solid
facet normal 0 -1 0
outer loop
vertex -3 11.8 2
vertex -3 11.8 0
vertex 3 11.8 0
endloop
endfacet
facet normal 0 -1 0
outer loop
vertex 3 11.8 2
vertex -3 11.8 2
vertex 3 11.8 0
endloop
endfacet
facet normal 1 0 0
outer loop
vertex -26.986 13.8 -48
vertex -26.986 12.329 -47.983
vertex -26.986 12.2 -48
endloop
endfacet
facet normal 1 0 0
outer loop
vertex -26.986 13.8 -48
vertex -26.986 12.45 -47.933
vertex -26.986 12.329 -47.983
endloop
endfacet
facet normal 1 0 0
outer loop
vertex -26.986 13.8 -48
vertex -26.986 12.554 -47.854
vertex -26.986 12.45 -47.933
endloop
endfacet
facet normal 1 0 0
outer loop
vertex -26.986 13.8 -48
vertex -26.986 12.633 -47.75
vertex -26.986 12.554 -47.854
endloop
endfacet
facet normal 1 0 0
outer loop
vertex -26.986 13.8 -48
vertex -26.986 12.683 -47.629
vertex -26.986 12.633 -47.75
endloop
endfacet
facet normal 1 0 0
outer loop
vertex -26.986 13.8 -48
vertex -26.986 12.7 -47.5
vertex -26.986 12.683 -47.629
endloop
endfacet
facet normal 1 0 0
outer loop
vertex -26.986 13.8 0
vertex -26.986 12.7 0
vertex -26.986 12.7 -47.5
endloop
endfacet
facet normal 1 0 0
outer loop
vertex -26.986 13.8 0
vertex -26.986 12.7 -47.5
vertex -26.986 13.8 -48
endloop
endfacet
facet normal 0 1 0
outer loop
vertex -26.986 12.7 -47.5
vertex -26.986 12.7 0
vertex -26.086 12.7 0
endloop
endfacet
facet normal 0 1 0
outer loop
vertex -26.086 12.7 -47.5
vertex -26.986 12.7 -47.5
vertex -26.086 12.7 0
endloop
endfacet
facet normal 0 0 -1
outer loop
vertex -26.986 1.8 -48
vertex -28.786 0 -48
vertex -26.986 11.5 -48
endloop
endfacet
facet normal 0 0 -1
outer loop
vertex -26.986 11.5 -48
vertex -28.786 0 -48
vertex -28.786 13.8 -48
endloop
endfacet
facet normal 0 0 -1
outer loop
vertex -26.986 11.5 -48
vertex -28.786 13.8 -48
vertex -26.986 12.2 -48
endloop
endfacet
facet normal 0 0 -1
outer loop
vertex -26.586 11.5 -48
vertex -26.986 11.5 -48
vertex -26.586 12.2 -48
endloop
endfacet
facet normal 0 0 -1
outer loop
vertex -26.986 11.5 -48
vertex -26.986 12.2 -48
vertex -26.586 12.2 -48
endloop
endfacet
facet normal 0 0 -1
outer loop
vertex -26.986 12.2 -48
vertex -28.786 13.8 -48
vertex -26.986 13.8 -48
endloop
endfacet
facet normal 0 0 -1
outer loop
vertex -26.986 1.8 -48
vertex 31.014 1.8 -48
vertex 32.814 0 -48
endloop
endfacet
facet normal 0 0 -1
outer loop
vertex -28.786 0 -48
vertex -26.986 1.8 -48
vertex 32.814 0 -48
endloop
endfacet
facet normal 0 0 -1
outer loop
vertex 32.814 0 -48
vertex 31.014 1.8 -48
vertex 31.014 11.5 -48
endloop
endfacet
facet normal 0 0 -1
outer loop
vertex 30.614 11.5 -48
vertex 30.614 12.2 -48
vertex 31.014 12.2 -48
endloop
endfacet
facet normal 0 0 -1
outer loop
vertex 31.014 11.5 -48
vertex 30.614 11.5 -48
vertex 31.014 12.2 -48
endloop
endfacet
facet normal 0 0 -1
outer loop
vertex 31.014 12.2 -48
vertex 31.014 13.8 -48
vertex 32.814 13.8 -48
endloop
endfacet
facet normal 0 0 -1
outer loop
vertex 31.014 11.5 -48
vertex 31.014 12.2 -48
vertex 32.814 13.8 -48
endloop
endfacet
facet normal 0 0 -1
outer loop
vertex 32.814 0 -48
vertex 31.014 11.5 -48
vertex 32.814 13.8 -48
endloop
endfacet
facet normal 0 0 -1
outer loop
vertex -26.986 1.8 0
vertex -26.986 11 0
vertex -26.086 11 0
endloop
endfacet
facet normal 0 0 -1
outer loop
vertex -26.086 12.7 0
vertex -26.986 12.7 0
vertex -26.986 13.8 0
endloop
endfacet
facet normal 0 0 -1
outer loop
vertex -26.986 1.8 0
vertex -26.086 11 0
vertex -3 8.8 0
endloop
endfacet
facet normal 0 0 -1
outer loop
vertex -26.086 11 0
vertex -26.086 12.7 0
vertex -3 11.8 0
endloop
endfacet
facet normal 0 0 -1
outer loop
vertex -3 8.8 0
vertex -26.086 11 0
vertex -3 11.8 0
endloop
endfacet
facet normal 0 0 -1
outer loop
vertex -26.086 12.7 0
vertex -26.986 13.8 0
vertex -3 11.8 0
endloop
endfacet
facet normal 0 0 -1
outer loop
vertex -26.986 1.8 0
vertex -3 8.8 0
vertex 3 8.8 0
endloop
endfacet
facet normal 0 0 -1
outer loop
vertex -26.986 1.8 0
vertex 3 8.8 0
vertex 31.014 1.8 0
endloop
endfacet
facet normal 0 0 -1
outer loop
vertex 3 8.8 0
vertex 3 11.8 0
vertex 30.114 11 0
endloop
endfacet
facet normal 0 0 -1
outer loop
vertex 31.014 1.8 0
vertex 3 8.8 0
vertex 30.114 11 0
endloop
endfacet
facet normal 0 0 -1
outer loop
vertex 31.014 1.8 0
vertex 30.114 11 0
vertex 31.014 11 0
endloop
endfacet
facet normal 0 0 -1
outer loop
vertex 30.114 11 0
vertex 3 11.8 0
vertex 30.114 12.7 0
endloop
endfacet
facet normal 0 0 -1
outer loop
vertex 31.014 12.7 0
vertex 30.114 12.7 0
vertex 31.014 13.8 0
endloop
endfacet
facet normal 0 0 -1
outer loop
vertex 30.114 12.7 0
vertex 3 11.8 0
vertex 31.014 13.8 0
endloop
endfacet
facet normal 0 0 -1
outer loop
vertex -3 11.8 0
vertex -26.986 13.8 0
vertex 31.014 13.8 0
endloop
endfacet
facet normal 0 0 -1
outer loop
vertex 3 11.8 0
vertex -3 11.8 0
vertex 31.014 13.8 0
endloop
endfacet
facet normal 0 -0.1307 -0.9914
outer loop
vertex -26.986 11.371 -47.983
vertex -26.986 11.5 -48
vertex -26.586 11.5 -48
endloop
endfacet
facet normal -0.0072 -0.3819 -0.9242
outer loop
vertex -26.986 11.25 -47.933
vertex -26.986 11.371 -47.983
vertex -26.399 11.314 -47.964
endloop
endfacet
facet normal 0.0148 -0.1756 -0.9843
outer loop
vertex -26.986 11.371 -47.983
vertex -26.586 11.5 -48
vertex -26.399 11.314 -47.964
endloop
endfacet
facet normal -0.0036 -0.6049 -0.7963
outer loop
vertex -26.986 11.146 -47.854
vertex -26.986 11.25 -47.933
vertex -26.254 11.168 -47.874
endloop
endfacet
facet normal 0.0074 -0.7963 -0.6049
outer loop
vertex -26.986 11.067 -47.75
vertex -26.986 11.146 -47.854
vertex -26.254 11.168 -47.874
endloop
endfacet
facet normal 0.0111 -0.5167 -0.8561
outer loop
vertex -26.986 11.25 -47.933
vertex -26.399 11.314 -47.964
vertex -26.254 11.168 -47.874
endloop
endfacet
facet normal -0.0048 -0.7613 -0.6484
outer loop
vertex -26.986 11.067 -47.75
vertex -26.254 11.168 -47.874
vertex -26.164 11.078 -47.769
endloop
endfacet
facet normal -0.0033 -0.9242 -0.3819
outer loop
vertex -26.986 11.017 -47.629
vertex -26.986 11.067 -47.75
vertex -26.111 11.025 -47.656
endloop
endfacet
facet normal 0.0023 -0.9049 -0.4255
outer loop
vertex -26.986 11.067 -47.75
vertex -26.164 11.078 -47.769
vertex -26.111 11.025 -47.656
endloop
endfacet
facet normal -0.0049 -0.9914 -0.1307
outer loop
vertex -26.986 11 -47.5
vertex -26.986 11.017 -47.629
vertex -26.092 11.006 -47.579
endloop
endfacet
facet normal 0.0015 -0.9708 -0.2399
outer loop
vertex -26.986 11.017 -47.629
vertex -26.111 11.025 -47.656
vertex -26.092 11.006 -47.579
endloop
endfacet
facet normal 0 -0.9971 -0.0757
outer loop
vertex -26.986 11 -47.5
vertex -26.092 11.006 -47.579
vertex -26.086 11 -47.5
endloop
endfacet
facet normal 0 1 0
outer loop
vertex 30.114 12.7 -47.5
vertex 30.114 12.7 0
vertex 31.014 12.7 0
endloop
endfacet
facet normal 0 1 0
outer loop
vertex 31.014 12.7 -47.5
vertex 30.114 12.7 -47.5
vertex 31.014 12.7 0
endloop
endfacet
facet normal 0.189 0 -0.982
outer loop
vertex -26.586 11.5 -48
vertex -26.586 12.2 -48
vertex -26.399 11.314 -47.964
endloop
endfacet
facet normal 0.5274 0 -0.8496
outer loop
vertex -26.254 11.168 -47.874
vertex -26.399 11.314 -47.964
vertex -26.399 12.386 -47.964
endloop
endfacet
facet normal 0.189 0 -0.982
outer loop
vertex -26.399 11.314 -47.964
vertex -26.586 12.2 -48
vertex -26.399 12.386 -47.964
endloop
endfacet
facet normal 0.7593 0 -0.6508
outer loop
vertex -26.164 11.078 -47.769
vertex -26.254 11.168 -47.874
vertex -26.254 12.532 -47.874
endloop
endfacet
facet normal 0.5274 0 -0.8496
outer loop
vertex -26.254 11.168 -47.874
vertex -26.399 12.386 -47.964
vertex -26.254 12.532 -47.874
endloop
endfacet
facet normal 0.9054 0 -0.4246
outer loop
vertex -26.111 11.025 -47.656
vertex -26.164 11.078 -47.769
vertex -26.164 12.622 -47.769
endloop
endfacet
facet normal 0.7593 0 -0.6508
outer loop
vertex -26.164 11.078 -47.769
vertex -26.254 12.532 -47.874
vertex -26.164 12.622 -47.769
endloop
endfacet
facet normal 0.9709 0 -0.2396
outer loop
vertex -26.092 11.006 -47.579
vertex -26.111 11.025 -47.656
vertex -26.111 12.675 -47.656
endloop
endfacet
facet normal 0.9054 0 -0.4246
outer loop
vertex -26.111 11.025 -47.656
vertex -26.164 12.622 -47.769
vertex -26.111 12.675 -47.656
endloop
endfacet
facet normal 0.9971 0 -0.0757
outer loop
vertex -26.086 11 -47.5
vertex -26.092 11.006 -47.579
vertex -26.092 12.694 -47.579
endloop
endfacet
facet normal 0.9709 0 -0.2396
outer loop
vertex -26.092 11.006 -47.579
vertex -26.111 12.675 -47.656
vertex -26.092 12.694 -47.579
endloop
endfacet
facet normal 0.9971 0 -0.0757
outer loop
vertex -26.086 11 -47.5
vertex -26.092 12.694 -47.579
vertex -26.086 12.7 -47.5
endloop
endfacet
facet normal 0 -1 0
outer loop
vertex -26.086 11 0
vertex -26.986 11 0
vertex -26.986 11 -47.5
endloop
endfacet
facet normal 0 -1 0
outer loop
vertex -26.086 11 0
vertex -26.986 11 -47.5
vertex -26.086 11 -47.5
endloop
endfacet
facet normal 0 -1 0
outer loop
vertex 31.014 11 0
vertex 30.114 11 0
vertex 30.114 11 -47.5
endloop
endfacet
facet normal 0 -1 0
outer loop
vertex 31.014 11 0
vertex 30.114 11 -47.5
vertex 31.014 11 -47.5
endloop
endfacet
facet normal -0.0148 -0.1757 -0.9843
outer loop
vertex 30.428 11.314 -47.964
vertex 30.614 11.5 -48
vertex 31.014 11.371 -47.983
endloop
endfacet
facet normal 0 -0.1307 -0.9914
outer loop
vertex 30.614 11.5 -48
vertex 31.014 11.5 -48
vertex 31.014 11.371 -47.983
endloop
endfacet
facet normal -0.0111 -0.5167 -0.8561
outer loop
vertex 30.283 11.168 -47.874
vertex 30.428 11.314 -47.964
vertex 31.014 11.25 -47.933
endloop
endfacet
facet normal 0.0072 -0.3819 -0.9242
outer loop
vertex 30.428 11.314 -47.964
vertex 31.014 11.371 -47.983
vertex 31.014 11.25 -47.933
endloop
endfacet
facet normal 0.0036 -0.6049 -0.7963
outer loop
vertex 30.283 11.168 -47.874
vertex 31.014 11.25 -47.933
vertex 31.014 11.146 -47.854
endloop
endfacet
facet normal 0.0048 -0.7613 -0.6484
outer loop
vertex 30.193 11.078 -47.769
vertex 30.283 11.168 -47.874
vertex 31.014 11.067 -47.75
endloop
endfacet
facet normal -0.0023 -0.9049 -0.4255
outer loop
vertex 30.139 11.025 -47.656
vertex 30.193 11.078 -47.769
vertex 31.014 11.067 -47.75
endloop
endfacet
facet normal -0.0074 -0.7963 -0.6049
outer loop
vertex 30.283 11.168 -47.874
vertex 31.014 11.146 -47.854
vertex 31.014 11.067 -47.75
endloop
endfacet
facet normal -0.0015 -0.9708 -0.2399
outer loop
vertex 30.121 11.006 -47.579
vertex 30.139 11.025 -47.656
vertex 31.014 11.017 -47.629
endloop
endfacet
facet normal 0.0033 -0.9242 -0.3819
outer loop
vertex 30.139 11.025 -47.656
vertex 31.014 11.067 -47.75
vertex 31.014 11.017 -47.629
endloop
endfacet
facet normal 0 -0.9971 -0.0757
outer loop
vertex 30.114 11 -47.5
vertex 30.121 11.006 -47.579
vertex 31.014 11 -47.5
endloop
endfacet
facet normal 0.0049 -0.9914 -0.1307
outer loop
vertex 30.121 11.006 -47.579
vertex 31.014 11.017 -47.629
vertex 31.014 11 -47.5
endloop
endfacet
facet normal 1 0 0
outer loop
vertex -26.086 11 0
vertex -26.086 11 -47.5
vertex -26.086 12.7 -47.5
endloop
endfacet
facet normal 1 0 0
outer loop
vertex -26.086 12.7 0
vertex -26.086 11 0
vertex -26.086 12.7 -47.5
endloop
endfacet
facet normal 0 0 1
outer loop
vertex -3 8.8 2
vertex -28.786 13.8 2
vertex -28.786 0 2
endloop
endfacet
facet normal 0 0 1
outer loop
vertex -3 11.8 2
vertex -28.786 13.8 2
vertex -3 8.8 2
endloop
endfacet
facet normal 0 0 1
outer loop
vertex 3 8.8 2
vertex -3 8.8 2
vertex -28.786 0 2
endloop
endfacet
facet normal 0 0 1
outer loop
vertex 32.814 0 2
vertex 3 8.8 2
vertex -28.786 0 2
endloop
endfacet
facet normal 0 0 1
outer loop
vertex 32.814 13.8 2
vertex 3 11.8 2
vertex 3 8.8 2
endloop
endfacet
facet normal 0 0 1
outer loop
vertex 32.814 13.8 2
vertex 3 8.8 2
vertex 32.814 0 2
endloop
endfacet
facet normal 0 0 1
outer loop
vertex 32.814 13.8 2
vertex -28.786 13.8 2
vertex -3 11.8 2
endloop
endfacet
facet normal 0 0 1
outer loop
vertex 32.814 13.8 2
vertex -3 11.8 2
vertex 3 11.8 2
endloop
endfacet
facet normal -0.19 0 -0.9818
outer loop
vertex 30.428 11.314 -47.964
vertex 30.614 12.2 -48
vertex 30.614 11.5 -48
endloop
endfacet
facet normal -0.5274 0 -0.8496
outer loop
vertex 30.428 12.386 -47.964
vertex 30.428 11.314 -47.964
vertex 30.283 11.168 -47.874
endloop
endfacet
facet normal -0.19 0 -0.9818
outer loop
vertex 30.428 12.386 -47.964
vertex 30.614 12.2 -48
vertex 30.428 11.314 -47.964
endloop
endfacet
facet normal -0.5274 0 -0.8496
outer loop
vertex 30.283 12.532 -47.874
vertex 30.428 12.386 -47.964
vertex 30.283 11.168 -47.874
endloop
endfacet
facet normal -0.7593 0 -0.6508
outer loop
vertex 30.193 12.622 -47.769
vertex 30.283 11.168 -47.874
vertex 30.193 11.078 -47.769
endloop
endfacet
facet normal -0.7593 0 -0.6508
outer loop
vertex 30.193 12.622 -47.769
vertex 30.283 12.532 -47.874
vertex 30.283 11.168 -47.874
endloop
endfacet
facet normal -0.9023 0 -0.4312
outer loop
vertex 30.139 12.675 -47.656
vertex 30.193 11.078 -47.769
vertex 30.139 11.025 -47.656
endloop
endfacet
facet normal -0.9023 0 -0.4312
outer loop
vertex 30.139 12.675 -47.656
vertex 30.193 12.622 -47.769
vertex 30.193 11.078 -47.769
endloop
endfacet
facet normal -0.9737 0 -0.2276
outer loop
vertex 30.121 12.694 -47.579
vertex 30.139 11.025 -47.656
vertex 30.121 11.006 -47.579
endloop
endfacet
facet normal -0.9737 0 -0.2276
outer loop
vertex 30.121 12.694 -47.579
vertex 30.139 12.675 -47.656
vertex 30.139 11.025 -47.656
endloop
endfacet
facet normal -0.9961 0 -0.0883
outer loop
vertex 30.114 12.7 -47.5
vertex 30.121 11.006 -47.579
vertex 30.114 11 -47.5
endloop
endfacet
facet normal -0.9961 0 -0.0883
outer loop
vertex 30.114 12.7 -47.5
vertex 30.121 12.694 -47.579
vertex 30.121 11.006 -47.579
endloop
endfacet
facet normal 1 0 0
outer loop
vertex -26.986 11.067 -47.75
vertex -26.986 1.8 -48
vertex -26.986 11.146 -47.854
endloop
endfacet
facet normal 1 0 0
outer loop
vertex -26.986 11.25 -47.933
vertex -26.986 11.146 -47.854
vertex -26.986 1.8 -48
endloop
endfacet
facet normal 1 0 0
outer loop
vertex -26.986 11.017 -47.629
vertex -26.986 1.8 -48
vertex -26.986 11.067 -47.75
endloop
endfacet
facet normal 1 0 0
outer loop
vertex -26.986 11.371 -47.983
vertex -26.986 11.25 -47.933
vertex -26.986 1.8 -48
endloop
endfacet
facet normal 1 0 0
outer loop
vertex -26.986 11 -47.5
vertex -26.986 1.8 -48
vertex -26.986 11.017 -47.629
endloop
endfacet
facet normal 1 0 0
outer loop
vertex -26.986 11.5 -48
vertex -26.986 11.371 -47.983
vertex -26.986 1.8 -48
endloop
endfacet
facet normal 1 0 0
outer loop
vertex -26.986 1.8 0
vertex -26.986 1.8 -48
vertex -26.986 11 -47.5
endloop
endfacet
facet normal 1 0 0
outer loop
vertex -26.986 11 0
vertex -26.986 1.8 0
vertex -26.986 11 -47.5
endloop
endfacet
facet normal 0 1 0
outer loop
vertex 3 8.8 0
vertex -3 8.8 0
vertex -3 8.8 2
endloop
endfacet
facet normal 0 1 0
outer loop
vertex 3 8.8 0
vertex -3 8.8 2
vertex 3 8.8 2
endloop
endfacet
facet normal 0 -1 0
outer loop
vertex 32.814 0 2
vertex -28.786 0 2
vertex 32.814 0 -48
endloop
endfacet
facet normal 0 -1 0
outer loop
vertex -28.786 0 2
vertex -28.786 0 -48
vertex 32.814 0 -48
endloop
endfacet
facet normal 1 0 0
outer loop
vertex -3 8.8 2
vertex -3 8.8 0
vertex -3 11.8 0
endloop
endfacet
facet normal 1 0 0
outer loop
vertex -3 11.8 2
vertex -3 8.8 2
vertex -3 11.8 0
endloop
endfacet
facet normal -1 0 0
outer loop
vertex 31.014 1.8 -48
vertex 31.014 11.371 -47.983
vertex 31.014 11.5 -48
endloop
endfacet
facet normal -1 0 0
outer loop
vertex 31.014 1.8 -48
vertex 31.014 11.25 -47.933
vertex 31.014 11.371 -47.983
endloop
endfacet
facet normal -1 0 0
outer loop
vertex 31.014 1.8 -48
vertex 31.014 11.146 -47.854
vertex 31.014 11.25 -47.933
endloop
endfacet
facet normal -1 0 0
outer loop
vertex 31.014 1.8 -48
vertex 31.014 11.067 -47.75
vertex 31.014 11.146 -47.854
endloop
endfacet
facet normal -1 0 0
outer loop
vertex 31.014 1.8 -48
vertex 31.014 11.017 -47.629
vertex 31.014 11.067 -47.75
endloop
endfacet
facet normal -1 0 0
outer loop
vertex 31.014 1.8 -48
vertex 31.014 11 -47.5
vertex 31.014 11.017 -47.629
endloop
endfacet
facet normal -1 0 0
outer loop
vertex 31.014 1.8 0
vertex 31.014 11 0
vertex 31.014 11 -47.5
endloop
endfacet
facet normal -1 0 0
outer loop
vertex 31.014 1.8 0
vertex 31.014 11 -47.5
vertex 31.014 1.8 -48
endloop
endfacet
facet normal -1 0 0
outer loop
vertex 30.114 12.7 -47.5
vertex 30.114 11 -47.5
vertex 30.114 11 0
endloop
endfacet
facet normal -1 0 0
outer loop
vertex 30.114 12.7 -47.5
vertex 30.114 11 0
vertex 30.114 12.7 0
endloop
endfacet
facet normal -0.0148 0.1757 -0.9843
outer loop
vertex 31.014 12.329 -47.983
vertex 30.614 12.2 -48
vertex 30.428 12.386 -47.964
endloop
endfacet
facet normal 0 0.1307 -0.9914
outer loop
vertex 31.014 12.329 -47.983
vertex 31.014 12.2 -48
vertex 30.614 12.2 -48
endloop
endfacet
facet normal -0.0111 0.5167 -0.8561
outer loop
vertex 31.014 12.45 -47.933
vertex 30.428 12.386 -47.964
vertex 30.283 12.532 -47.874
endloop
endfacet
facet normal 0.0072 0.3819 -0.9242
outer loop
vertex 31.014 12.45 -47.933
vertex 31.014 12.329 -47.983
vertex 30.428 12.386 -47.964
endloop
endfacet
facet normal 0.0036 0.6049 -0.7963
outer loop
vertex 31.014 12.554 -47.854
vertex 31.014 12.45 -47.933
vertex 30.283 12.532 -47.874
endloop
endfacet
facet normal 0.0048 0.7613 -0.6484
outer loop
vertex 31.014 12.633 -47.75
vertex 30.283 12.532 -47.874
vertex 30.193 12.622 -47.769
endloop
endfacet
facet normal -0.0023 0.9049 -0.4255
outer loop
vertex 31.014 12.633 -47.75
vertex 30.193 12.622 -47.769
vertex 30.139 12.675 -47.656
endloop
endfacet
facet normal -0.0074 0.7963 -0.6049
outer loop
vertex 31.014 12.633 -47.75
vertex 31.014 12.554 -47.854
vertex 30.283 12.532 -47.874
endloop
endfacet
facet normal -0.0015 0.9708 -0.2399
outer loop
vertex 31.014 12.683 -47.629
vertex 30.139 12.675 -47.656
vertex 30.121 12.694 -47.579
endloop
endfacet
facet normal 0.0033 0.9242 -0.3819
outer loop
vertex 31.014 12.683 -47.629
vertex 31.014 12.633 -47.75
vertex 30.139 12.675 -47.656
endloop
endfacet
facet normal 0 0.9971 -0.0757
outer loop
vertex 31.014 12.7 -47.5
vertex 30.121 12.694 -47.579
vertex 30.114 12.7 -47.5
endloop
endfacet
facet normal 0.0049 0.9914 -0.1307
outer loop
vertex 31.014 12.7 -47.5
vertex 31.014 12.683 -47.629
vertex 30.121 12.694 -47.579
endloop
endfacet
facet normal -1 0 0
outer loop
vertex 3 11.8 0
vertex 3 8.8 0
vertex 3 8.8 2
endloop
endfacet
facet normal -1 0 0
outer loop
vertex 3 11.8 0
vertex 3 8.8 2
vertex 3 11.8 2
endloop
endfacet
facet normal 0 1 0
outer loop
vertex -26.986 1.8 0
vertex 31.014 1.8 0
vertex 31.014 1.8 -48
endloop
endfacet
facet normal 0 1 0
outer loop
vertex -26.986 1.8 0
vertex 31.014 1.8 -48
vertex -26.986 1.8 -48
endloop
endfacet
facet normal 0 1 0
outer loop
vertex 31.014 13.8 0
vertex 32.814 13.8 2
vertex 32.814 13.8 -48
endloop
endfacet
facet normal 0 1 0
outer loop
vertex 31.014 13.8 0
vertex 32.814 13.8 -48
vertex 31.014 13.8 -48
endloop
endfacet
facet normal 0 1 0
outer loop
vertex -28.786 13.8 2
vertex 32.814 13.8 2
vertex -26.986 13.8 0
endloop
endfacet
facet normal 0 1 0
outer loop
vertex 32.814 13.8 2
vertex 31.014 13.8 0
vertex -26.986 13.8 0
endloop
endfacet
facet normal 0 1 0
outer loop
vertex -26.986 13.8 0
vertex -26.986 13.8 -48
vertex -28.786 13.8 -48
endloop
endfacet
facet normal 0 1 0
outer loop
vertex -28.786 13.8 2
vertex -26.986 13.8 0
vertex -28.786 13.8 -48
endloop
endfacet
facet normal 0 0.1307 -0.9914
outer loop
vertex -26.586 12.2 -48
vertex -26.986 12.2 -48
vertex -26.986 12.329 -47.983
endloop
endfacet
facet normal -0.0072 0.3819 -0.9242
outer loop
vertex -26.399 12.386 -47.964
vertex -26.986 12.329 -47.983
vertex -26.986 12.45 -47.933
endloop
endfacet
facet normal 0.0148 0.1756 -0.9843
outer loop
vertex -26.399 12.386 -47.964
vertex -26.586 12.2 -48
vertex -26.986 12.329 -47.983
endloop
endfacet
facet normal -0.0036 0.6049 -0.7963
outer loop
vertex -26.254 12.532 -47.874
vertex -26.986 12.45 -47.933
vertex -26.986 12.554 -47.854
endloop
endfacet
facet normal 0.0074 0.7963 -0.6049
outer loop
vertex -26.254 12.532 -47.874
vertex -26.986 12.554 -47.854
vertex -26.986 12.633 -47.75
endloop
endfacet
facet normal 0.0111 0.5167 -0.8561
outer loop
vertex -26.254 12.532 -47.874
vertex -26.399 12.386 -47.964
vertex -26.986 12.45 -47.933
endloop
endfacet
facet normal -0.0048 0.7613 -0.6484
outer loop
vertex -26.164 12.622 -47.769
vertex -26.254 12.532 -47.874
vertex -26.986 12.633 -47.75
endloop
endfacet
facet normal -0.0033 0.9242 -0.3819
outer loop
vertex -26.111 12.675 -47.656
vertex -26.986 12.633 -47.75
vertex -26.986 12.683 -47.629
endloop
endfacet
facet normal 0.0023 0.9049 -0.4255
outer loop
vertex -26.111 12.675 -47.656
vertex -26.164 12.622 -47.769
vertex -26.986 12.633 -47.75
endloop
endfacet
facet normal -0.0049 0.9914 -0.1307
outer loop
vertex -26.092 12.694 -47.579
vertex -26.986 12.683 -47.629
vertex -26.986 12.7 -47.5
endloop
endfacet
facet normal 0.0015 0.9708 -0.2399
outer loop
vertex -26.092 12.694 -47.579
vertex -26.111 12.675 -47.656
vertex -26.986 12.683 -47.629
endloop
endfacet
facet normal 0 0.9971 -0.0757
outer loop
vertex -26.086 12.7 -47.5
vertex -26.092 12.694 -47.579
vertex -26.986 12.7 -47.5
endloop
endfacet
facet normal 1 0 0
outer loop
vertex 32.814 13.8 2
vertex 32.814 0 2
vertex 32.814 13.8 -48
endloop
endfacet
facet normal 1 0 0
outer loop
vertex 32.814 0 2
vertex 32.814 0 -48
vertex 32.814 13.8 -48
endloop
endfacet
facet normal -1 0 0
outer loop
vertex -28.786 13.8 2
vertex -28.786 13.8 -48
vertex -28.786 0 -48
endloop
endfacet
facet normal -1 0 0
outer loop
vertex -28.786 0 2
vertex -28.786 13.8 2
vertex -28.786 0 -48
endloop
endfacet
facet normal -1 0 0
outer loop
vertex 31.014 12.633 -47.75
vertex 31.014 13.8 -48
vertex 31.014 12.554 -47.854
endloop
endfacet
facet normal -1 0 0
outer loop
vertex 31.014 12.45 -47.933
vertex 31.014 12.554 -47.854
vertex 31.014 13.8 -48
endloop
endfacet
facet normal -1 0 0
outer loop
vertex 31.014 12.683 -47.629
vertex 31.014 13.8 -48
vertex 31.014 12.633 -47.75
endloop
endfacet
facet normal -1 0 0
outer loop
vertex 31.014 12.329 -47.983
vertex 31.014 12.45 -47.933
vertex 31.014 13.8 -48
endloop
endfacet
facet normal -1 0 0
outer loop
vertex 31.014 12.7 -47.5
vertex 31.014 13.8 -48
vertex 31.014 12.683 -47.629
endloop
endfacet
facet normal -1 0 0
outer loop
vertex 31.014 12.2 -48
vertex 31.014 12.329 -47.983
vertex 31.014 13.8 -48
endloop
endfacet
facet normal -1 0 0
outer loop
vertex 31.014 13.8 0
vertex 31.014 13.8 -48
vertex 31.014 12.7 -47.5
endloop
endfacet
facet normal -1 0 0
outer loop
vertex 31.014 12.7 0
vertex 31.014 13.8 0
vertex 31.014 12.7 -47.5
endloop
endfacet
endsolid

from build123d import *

# Parameters (mm, degrees)
F0_W     = 0.9
F0_H     = 1.7
F1_DEPTH = 48
F0_W_2   = 6
F0_H_2   = 3
F2_DEPTH = 2
F3_R     = 0.5


with BuildPart() as f1:
    # F0 (on Top) → F1 (new body)
    with BuildSketch(Plane.XY):
        Polygon((-26.985715, 13.8), (-28.785715, 13.8), (-28.785715, 0), (32.814285, 0), (32.814285, 13.8), (31.014285, 13.8), (31.014285, 12.7), (31.014285, 11), (31.014285, 1.8), (-26.985715, 1.8), (-26.985715, 11), (-26.985715, 12.7), align=None)
        with Locations((-26.535715, 11.85)):
            Rectangle(F0_W, F0_H)
        with Locations((30.564285, 11.85)):
            Rectangle(F0_W, F0_H)
    extrude(amount=-F1_DEPTH)

    # F0 (on Top) → F2 (join)
    with BuildSketch(Plane.XY):
        Polygon((31.014285, 13.8), (-26.985715, 13.8), (-26.985715, 12.7), (-26.085715, 12.7), (-26.085715, 11), (-26.985715, 11), (-26.985715, 1.8), (31.014285, 1.8), (31.014285, 11), (30.114285, 11), (30.114285, 12.7), (31.014285, 12.7), align=None)
        with Locations((0, 10.3)):
            Rectangle(F0_W_2, F0_H_2, mode=Mode.SUBTRACT)
        Polygon((-26.985715, 13.8), (-28.785715, 13.8), (-28.785715, 0), (32.814285, 0), (32.814285, 13.8), (31.014285, 13.8), (31.014285, 12.7), (31.014285, 11), (31.014285, 1.8), (-26.985715, 1.8), (-26.985715, 11), (-26.985715, 12.7), align=None)
        with Locations((-26.535715, 11.85)):
            Rectangle(F0_W, F0_H)
        with Locations((30.564285, 11.85)):
            Rectangle(F0_W, F0_H)
    extrude(amount=F2_DEPTH)

    # F3
    f3_edges = [f1.edges().sort_by_distance(p)[0] for p in [
        (-26.535715, 11, -48),
        (-26.535715, 12.7, -48),
        (-26.085715, 11.85, -48),
        (30.564285, 11, -48),
        (30.564285, 12.7, -48),
        (30.114285, 11.85, -48),
    ]]
    fillet(f3_edges, radius=F3_R)


solid = f1.part
